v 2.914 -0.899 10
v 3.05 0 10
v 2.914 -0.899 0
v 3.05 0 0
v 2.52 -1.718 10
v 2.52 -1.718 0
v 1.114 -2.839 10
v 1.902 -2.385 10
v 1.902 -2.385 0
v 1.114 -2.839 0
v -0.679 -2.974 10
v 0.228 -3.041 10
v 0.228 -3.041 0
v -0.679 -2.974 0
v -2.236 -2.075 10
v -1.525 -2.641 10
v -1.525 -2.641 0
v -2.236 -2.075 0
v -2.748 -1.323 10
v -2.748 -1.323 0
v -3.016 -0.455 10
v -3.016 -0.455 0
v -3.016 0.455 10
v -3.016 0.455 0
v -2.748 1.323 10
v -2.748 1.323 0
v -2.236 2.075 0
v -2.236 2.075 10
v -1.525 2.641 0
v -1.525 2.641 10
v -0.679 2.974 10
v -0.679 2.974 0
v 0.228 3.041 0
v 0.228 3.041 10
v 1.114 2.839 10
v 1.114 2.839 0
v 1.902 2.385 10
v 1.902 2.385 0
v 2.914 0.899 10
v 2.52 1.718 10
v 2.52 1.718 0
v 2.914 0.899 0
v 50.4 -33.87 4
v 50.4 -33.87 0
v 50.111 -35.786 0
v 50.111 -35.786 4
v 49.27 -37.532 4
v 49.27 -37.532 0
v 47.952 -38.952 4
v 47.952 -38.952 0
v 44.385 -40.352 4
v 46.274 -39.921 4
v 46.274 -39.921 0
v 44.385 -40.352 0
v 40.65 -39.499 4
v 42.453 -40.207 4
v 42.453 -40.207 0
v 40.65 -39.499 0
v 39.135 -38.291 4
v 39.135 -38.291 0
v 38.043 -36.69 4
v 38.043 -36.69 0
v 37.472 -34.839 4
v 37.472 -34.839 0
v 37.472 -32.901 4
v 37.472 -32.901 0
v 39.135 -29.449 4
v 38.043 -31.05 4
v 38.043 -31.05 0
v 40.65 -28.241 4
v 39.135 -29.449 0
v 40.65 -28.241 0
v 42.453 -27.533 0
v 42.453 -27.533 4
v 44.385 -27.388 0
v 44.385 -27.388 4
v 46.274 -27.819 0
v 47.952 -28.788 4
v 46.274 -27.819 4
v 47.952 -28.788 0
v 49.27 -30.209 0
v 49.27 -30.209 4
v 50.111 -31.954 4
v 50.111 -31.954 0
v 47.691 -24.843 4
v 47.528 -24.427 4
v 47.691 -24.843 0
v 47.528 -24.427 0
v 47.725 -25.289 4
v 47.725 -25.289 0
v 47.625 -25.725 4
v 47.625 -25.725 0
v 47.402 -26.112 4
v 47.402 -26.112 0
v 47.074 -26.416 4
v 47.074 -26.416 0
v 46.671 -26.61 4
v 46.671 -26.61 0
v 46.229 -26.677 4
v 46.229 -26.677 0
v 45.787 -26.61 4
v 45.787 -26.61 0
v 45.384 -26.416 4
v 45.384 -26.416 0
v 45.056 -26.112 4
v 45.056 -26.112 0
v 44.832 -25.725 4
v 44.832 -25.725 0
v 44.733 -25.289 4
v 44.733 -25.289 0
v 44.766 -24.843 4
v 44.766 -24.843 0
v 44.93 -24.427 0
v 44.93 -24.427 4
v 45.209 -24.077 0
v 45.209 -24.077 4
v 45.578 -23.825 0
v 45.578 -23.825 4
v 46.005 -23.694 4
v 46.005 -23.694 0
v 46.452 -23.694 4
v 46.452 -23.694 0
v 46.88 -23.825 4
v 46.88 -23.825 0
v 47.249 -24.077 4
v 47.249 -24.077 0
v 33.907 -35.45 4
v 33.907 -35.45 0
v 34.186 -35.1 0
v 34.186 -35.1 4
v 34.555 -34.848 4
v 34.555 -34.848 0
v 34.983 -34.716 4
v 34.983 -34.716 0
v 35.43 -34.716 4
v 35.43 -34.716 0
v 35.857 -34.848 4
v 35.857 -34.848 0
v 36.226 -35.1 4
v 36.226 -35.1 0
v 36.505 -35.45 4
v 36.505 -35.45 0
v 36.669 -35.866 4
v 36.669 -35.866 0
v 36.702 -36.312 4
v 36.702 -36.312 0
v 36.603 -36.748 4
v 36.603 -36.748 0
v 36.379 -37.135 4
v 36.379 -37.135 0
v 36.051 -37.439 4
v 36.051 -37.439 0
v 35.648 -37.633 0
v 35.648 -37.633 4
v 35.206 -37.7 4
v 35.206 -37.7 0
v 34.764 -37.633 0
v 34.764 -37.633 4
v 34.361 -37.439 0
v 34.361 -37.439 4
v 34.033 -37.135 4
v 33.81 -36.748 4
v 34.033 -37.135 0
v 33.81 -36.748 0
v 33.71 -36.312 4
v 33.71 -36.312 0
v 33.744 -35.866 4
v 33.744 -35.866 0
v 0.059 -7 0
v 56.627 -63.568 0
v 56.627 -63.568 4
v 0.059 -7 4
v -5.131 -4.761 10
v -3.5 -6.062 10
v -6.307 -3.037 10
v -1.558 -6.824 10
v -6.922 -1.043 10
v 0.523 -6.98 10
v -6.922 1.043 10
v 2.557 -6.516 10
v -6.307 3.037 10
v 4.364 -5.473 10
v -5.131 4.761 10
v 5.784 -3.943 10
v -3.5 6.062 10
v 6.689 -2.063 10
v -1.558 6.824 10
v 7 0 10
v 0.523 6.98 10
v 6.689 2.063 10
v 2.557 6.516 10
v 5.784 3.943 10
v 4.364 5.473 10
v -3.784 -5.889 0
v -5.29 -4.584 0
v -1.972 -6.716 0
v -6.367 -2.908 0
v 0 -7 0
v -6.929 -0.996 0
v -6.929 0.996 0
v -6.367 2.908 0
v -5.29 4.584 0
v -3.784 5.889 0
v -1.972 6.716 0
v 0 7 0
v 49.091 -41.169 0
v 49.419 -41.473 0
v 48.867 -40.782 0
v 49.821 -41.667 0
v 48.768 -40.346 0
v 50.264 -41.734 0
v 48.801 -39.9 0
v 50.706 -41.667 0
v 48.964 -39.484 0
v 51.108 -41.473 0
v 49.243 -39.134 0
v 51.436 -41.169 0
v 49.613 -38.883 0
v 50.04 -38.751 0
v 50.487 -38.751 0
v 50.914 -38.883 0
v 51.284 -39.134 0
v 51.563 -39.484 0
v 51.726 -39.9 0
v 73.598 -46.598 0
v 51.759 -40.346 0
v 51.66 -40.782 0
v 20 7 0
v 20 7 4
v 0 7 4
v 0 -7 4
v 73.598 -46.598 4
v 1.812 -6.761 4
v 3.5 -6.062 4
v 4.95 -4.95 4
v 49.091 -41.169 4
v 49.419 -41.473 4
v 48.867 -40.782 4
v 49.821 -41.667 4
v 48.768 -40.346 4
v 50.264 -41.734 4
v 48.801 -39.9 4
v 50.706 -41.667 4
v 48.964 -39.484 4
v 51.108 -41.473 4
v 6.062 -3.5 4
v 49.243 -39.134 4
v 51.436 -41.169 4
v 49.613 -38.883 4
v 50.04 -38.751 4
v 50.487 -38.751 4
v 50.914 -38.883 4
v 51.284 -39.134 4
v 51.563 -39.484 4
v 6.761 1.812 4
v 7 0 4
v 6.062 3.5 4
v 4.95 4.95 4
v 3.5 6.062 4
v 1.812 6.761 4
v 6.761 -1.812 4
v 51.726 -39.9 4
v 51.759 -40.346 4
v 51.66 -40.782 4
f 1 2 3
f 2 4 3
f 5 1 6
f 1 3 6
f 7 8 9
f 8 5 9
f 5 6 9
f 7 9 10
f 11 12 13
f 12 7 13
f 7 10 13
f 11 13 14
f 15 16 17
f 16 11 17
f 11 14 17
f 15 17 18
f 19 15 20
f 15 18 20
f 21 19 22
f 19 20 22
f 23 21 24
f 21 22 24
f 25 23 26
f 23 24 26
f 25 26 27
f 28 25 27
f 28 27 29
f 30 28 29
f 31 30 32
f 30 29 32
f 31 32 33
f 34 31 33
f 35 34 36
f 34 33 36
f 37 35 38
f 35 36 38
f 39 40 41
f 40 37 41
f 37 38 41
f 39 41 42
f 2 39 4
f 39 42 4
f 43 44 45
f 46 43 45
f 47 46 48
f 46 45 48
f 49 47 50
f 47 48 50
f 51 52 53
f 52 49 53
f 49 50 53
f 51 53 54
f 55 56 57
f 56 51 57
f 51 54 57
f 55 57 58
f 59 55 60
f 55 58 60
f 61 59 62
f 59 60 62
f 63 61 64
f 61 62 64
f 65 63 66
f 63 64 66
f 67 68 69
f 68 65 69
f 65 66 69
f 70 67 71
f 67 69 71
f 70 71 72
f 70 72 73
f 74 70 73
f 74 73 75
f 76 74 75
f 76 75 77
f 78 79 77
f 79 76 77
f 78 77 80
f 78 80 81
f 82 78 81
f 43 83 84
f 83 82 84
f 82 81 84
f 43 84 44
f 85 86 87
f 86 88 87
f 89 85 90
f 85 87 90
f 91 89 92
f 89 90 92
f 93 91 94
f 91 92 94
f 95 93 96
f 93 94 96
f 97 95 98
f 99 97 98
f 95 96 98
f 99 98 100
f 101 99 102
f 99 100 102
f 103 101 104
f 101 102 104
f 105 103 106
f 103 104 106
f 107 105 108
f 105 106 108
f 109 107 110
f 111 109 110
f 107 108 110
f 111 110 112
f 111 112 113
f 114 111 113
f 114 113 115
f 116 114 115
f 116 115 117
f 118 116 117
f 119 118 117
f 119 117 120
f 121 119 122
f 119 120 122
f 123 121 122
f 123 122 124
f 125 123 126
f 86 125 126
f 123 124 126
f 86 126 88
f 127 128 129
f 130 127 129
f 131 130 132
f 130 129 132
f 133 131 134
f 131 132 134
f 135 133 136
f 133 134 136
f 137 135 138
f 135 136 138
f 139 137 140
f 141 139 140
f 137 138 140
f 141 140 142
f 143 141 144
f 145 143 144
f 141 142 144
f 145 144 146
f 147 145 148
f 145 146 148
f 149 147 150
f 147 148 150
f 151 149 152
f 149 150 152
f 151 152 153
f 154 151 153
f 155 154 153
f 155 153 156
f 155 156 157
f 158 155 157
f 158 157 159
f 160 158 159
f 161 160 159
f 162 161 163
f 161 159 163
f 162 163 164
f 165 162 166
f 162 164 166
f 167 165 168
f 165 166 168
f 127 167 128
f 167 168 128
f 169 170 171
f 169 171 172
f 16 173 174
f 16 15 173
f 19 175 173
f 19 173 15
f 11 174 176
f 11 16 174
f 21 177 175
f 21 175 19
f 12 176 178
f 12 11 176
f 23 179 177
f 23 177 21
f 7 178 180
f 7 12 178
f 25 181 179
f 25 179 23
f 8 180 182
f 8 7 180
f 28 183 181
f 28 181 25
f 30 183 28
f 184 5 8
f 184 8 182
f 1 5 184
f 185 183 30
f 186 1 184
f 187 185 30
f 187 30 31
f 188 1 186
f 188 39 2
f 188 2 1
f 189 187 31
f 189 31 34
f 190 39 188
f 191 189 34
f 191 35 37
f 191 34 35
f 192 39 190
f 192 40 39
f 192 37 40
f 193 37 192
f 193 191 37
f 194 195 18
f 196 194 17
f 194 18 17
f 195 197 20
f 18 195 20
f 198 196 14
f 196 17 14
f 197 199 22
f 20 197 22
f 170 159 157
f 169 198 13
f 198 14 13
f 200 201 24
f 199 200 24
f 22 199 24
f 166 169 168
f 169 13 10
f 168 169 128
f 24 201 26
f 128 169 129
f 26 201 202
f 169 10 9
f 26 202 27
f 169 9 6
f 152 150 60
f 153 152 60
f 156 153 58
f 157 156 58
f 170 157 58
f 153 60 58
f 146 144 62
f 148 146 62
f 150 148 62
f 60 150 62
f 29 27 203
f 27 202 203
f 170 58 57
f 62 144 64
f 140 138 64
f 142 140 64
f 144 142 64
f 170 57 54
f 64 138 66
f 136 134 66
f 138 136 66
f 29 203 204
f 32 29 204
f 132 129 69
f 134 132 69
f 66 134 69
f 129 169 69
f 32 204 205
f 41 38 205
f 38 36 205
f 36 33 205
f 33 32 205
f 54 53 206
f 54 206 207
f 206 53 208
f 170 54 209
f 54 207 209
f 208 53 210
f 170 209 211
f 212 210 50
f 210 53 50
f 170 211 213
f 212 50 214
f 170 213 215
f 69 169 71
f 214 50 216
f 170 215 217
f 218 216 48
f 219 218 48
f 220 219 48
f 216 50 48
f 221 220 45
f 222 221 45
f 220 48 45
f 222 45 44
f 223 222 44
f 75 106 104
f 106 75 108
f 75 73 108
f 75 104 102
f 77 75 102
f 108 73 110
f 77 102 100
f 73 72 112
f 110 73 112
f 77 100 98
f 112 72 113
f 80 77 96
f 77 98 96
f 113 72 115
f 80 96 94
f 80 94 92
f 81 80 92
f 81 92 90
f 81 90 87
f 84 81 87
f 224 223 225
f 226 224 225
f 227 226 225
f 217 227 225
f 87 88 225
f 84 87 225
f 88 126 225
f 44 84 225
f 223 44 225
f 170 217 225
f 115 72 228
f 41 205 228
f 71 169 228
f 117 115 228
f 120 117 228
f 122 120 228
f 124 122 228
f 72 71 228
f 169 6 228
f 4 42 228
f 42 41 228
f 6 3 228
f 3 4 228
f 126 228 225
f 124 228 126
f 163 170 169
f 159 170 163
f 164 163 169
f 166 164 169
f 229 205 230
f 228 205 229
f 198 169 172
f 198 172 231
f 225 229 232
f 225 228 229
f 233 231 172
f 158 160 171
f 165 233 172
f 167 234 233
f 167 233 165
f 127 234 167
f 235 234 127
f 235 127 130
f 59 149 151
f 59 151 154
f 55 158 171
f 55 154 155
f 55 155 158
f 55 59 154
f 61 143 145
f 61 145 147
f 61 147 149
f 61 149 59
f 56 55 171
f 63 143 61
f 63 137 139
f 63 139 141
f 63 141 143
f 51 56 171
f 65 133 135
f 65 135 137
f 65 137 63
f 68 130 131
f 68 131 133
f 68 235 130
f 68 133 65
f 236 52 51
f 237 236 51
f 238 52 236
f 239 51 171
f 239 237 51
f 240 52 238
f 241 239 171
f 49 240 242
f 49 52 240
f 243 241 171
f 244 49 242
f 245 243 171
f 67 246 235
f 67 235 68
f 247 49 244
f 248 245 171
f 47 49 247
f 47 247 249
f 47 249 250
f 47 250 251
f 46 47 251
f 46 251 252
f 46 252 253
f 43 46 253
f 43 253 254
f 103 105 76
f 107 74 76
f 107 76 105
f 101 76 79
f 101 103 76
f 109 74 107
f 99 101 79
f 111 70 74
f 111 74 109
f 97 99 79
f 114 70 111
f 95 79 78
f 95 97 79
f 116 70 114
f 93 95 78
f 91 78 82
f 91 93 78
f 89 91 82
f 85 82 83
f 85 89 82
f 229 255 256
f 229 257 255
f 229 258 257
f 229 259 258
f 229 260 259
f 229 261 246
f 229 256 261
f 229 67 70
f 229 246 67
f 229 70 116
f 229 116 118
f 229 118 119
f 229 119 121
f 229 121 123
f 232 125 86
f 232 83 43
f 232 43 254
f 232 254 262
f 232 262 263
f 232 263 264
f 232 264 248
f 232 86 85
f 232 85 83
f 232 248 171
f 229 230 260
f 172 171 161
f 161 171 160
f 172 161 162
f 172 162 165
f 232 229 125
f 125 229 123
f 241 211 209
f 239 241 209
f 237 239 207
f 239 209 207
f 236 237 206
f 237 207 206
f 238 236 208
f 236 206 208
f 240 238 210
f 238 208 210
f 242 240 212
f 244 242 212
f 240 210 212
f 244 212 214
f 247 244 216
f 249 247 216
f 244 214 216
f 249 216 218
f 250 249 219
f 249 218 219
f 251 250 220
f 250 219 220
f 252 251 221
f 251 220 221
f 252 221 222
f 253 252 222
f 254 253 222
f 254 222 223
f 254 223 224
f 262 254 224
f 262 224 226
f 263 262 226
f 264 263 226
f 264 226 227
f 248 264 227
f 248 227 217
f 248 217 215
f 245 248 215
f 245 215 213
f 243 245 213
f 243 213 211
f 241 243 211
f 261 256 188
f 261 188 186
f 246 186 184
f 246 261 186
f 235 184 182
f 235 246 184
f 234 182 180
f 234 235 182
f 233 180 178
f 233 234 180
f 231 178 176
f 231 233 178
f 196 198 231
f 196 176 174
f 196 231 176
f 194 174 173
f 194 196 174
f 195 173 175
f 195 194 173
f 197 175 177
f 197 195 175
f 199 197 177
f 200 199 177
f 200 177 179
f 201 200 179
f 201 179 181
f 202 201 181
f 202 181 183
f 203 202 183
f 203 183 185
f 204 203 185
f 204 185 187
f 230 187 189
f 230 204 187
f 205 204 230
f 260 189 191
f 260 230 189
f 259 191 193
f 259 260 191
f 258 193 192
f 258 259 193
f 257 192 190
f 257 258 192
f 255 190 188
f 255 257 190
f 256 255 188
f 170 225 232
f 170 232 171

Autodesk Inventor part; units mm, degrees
ref_plane "YZ Plane" through (0, 0, 0) normal (1, 0, 0) x (0, 1, 0)
ref_plane "XZ Plane" through (0, 0, 0) normal (0, 1, 0) x (-1, 0, 0)
ref_plane "XY Plane" through (0, 0, 0) normal (0, 0, 1) x (1, 0, 0)
sketch "Skizze1" plane through (0, 0, 0) normal (0, 0, 1) x (1, 0, 0)
  arc A0 (0, 7) -> (0, -7) centre (0, 0) ccw
  line L0 (0, 7) -> (20, 7)
  line L1 (20, 7) -> (73.598, -46.598)
  line L2 (73.598, -46.598) -> (56.6274, -63.5685)
  line L3 (56.6274, -63.5685) -> (0.0589, -7)
  line L4 (0.0589, -7) -> (0, -7)
  line L5 (65.1127, -55.0833) -> (43.8995, -33.8701) construction
  circle A1 centre (43.8995, -33.8701) radius 6.5
  circle A2 centre (0, 0) radius 3.05
  dimension "d0" = 14
  dimension "d1" = 6.1
  dimension "d2" = 13
  dimension "d3" = 24
  dimension "d4" = 80
  dimension "d5" = 30
  dimension "d6" = 20
  dimension "d7" = 135
extrude "Extrusion1" add sketch "Skizze1" along normal blind 4
sketch "Skizze4" plane through (0, 0, 4) normal (0, 0, 1) x (1, 0, 0)
  circle A0 centre (0, 0) radius 3.05
  circle A1 centre (0, 0) radius 7
  dimension "d18" = 14
  dimension "d19" = 6.1
extrude "Extrusion4" add sketch "Skizze4" along normal blind 6
hole "Bohrung1" at (50.2635, -40.234, 4) direction (0, 0, -1) diameter 3 depth 8 tip angle 118
pattern_circular "Runde Anordnung1" count 3 over 360 about axis through (43.8995, -33.8701, 0) along (0, 0, 1) of "Bohrung1"
properties part number "Armlinks"
